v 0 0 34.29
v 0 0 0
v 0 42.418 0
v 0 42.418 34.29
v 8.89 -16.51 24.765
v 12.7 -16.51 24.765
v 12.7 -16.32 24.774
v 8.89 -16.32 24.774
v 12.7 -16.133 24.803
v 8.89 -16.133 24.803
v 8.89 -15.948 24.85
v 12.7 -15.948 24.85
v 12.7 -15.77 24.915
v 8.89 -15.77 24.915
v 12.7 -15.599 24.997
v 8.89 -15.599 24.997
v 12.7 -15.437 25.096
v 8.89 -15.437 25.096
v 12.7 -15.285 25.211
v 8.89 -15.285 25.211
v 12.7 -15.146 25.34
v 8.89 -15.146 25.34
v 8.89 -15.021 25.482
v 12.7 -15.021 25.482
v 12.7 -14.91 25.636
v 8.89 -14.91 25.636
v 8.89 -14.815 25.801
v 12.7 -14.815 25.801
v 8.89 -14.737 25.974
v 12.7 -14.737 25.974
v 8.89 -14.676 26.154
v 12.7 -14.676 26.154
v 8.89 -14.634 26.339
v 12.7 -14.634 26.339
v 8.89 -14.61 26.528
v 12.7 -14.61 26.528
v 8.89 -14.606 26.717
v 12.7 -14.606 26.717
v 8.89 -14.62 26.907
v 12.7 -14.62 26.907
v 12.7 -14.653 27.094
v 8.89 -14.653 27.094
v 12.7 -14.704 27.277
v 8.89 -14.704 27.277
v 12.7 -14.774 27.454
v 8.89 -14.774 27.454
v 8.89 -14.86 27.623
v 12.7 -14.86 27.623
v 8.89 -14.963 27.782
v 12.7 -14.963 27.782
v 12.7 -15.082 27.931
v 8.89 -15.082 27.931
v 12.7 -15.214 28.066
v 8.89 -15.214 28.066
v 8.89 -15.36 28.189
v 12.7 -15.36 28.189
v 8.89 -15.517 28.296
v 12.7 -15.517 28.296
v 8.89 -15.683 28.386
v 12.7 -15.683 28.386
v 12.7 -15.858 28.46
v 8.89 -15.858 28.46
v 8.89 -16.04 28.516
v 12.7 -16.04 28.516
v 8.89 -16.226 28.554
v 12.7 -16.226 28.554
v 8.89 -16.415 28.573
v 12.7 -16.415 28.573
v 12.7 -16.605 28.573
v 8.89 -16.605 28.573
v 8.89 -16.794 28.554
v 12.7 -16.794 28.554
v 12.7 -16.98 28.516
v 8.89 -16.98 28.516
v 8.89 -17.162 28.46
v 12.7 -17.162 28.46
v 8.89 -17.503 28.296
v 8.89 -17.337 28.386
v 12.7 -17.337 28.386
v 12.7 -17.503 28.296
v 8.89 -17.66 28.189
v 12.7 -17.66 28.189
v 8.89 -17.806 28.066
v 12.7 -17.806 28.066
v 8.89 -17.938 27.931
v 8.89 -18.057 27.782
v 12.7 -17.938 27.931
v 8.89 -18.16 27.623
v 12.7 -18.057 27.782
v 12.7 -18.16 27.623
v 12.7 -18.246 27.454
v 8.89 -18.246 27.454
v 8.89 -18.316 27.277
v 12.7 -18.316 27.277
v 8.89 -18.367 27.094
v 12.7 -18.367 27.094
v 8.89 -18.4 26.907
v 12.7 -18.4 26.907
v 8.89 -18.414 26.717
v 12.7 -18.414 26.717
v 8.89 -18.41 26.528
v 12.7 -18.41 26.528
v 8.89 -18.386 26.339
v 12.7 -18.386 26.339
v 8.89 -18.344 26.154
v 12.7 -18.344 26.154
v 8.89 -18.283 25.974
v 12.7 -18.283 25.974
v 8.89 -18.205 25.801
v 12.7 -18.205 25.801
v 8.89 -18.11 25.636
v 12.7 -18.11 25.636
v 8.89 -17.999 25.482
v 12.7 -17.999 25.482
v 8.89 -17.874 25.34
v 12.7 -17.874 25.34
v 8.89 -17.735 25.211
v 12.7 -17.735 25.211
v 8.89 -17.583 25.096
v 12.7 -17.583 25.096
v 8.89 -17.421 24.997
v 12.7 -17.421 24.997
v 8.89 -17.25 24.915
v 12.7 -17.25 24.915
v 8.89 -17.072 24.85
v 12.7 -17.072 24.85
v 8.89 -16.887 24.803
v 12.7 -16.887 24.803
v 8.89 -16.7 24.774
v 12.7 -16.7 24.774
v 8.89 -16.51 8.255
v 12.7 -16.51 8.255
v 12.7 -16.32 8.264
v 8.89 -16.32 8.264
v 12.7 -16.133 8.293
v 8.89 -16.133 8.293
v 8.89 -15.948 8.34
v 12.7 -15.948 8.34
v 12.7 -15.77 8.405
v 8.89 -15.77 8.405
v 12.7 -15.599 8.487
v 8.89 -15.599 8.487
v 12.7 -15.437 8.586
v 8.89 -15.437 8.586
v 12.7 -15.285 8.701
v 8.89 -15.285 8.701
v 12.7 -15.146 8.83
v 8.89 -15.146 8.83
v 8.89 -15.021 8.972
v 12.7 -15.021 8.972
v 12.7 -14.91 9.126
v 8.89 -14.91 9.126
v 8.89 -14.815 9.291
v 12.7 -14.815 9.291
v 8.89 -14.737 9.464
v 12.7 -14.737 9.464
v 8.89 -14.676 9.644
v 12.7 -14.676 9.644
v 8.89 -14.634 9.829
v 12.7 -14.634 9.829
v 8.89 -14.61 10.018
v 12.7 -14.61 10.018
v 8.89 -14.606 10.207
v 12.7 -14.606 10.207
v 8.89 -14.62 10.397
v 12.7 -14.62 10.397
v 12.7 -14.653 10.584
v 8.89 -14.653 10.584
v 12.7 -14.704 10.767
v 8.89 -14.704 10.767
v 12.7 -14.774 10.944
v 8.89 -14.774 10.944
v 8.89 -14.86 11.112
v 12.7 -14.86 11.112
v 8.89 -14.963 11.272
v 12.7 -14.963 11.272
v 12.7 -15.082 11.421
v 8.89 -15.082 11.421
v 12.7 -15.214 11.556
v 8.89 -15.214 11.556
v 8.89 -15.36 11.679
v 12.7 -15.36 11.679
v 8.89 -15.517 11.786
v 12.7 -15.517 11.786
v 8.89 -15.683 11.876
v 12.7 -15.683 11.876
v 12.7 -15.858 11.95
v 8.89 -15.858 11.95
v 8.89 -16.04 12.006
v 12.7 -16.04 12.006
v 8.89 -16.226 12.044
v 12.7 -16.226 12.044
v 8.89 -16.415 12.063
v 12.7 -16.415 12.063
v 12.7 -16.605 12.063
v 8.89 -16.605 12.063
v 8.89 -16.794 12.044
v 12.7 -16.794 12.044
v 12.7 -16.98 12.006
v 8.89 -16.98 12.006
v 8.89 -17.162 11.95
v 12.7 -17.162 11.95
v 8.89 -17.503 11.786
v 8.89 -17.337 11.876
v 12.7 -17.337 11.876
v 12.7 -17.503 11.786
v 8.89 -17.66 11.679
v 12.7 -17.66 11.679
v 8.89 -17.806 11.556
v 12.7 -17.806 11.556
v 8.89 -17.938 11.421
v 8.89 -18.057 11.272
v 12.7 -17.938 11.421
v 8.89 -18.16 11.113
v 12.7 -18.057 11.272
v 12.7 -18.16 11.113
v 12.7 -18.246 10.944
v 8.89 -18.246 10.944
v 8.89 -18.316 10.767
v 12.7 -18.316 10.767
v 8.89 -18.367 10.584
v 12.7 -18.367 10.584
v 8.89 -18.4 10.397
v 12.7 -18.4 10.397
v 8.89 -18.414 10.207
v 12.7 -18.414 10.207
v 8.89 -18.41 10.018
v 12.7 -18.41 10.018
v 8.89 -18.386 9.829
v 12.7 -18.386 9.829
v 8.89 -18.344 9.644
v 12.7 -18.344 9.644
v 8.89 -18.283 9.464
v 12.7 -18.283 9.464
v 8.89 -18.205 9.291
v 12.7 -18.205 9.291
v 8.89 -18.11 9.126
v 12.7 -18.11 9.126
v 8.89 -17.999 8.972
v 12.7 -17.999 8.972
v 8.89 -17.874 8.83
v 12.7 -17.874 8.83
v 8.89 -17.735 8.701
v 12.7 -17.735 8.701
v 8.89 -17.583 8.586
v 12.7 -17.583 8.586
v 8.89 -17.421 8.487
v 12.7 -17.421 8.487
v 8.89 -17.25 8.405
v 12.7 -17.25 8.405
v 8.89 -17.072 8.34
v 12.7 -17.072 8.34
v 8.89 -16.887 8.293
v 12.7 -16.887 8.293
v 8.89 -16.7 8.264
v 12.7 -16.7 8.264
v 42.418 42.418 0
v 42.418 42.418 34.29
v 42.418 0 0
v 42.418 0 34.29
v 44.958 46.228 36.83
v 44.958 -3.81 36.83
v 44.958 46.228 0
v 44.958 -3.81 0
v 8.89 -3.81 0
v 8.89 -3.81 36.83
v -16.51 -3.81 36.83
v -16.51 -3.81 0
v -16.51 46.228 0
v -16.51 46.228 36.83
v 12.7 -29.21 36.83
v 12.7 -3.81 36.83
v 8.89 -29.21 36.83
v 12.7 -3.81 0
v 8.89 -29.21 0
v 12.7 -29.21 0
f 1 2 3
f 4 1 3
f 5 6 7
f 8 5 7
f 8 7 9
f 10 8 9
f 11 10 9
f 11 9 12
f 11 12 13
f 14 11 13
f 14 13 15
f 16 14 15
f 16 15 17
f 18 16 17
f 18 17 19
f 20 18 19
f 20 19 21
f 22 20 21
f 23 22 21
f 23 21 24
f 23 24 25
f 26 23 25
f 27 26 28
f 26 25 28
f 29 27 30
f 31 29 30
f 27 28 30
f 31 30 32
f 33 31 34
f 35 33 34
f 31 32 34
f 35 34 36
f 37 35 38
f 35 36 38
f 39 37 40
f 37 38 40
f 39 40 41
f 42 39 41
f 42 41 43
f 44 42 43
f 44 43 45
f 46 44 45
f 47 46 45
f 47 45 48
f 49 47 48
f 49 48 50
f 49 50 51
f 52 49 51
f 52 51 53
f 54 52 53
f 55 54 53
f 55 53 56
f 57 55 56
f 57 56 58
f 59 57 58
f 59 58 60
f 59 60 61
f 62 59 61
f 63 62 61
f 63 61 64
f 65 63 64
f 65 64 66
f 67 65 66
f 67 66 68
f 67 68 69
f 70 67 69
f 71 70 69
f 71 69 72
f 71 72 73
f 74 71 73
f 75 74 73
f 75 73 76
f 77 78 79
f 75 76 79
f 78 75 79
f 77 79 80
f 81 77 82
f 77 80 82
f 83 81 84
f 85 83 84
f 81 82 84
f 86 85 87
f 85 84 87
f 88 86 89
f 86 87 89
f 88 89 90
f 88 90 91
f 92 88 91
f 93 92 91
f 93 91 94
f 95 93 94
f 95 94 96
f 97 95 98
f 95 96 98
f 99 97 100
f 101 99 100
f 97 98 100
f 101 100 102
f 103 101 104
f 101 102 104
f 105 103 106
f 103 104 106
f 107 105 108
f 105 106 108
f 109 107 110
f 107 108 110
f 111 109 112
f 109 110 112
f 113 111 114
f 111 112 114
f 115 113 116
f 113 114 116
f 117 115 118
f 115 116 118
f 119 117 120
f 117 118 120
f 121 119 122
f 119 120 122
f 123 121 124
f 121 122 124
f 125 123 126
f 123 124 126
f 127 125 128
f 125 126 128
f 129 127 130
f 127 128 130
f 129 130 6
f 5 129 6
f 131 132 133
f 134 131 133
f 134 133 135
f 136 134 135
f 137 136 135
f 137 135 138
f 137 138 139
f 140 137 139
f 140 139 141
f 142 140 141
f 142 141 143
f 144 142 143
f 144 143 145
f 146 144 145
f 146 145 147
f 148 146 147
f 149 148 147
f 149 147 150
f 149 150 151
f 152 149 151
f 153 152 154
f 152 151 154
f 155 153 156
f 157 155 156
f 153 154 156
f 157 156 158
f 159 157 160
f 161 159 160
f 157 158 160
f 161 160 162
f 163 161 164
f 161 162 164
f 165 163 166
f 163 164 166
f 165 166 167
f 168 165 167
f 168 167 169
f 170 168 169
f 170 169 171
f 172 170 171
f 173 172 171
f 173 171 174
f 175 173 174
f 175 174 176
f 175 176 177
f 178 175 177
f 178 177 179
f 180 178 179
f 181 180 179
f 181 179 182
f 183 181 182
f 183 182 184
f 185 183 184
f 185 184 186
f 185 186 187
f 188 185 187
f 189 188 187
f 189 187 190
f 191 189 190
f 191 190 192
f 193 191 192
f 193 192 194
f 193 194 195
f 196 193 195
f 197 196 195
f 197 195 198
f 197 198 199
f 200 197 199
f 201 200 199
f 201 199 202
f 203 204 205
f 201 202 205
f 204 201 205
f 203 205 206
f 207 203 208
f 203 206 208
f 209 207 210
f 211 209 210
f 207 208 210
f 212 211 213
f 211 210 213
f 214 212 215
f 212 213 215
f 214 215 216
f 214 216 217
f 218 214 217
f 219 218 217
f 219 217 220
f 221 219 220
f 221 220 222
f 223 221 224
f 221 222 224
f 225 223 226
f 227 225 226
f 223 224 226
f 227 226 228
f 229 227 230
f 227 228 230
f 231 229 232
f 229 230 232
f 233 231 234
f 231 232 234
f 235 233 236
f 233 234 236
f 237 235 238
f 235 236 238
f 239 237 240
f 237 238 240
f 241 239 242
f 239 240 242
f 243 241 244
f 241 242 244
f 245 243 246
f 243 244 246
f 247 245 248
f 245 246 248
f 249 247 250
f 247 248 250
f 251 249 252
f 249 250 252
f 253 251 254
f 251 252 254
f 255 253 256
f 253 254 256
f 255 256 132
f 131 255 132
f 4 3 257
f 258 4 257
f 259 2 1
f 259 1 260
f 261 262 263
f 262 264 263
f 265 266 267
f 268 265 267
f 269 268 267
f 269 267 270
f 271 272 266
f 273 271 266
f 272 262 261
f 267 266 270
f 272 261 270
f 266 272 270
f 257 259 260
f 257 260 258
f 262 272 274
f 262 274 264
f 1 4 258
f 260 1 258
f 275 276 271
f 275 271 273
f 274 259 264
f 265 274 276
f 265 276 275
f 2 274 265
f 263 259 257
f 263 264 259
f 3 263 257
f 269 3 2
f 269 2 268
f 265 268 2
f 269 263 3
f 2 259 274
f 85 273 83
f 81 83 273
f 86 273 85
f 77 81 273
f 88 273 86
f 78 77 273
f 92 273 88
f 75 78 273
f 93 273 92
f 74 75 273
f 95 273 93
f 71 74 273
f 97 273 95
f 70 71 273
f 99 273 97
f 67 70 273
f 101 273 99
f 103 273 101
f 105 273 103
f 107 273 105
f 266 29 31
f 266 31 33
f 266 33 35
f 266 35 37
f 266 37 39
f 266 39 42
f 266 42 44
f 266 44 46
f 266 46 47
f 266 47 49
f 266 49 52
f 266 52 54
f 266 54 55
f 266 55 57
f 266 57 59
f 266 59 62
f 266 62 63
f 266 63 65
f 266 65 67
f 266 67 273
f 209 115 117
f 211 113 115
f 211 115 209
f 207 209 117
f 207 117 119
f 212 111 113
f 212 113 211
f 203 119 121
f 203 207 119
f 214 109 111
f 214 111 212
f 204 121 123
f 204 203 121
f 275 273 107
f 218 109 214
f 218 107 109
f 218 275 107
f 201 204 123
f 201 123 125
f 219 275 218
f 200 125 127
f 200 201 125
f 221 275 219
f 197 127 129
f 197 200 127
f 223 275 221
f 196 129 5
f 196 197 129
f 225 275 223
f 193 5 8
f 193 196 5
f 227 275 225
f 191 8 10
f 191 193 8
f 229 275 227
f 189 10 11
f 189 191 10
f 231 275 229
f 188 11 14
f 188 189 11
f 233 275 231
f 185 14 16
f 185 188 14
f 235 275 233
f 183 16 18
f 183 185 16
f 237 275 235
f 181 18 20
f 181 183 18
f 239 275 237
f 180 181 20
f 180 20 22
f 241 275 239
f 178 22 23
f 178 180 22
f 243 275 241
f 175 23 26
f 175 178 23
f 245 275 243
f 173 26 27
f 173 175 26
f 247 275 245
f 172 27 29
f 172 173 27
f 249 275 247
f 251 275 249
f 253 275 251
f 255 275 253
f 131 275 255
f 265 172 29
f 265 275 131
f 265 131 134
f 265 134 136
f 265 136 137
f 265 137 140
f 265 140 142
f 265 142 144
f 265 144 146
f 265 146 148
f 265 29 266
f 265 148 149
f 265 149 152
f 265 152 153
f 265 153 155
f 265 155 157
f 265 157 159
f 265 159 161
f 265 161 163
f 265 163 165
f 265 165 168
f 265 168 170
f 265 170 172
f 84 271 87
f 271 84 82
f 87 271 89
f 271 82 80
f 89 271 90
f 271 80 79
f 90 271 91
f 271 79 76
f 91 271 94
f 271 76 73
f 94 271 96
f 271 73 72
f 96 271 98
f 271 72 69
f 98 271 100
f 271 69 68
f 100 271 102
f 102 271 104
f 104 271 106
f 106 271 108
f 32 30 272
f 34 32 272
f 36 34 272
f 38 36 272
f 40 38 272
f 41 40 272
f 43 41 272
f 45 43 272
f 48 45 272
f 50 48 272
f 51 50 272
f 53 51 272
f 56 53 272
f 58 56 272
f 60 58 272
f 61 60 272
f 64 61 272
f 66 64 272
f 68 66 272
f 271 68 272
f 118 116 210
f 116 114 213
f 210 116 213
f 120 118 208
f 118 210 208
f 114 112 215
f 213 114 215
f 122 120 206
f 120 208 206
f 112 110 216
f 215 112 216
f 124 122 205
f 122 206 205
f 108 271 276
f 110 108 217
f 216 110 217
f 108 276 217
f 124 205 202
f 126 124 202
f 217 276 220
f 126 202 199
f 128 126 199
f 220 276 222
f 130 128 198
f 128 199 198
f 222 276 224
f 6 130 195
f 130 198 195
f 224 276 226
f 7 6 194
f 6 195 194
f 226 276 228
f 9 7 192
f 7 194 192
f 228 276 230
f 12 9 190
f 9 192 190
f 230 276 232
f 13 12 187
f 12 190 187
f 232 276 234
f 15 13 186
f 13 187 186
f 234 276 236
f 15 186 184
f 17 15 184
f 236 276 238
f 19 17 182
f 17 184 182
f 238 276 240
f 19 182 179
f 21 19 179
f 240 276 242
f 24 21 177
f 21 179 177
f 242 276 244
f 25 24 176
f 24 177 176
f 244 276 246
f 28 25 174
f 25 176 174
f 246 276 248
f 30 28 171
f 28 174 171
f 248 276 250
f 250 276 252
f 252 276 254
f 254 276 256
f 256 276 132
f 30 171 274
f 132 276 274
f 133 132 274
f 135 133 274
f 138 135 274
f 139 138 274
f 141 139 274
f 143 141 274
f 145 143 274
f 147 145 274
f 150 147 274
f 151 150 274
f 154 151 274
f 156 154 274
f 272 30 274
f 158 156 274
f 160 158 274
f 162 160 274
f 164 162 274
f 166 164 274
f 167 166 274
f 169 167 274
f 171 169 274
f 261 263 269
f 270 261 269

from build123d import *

# Parameters (mm, degrees)
SKETCH2_W           = 48.768
SKETCH2_H           = 50.038
SKETCH2_W_2         = 42.418
SKETCH2_H_2         = 42.418
BOSS_EXTRUDE1_DEPTH = 34.29
SKETCH4_W           = 48.768
SKETCH4_H           = 50.038
BOSS_EXTRUDE2_DEPTH = 2.54
SKETCH5_W           = 3.81
SKETCH5_H           = 25.4
BOSS_EXTRUDE3_DEPTH = 36.83
SKETCH6_W           = 12.7
SKETCH6_H           = 50.038
BOSS_EXTRUDE4_DEPTH = 36.83
SKETCH7_R           = 1.905
CUT_EXTRUDE1_DEPTH  = 30.21


with BuildPart() as part:
    # Sketch2 → Boss-Extrude1 (new body)
    with BuildSketch(Plane.XY):
        with Locations((20.574, 21.209)):
            Rectangle(SKETCH2_W, SKETCH2_H)
        with Locations((21.209, 21.209)):
            Rectangle(SKETCH2_W_2, SKETCH2_H_2, mode=Mode.SUBTRACT)
    extrude(amount=BOSS_EXTRUDE1_DEPTH)

    # Sketch4 → Boss-Extrude2 (add)
    with BuildSketch(Plane.XY.offset(34.29)):
        with Locations((20.574, 21.209)):
            Rectangle(SKETCH4_W, SKETCH4_H)
    extrude(amount=BOSS_EXTRUDE2_DEPTH)

    # Sketch5 → Boss-Extrude3 (add)
    with BuildSketch(Plane(origin=(0, 0, 0), x_dir=(-1, 0, 0), z_dir=(0, 0, -1))):
        with Locations((-10.795, -16.51)):
            Rectangle(SKETCH5_W, SKETCH5_H)
    extrude(amount=-BOSS_EXTRUDE3_DEPTH)

    # Sketch6 → Boss-Extrude4 (add)
    with BuildSketch(Plane(origin=(0, 0, 0), x_dir=(-1, 0, 0), z_dir=(0, 0, -1))):
        with Locations((10.16, 21.209)):
            Rectangle(SKETCH6_W, SKETCH6_H)
    extrude(amount=-BOSS_EXTRUDE4_DEPTH)

    # Sketch7 → Cut-Extrude1 (cut, through all)
    with BuildSketch(Plane(origin=(12.7, 0, 0), x_dir=(0, 0, -1), z_dir=(1, 0, 0))):
        with Locations((-26.67, -16.51)):
            Circle(SKETCH7_R)
        with Locations((-10.16, -16.51)):
            Circle(SKETCH7_R)
    extrude(amount=-CUT_EXTRUDE1_DEPTH, mode=Mode.SUBTRACT)


solid = part.part
